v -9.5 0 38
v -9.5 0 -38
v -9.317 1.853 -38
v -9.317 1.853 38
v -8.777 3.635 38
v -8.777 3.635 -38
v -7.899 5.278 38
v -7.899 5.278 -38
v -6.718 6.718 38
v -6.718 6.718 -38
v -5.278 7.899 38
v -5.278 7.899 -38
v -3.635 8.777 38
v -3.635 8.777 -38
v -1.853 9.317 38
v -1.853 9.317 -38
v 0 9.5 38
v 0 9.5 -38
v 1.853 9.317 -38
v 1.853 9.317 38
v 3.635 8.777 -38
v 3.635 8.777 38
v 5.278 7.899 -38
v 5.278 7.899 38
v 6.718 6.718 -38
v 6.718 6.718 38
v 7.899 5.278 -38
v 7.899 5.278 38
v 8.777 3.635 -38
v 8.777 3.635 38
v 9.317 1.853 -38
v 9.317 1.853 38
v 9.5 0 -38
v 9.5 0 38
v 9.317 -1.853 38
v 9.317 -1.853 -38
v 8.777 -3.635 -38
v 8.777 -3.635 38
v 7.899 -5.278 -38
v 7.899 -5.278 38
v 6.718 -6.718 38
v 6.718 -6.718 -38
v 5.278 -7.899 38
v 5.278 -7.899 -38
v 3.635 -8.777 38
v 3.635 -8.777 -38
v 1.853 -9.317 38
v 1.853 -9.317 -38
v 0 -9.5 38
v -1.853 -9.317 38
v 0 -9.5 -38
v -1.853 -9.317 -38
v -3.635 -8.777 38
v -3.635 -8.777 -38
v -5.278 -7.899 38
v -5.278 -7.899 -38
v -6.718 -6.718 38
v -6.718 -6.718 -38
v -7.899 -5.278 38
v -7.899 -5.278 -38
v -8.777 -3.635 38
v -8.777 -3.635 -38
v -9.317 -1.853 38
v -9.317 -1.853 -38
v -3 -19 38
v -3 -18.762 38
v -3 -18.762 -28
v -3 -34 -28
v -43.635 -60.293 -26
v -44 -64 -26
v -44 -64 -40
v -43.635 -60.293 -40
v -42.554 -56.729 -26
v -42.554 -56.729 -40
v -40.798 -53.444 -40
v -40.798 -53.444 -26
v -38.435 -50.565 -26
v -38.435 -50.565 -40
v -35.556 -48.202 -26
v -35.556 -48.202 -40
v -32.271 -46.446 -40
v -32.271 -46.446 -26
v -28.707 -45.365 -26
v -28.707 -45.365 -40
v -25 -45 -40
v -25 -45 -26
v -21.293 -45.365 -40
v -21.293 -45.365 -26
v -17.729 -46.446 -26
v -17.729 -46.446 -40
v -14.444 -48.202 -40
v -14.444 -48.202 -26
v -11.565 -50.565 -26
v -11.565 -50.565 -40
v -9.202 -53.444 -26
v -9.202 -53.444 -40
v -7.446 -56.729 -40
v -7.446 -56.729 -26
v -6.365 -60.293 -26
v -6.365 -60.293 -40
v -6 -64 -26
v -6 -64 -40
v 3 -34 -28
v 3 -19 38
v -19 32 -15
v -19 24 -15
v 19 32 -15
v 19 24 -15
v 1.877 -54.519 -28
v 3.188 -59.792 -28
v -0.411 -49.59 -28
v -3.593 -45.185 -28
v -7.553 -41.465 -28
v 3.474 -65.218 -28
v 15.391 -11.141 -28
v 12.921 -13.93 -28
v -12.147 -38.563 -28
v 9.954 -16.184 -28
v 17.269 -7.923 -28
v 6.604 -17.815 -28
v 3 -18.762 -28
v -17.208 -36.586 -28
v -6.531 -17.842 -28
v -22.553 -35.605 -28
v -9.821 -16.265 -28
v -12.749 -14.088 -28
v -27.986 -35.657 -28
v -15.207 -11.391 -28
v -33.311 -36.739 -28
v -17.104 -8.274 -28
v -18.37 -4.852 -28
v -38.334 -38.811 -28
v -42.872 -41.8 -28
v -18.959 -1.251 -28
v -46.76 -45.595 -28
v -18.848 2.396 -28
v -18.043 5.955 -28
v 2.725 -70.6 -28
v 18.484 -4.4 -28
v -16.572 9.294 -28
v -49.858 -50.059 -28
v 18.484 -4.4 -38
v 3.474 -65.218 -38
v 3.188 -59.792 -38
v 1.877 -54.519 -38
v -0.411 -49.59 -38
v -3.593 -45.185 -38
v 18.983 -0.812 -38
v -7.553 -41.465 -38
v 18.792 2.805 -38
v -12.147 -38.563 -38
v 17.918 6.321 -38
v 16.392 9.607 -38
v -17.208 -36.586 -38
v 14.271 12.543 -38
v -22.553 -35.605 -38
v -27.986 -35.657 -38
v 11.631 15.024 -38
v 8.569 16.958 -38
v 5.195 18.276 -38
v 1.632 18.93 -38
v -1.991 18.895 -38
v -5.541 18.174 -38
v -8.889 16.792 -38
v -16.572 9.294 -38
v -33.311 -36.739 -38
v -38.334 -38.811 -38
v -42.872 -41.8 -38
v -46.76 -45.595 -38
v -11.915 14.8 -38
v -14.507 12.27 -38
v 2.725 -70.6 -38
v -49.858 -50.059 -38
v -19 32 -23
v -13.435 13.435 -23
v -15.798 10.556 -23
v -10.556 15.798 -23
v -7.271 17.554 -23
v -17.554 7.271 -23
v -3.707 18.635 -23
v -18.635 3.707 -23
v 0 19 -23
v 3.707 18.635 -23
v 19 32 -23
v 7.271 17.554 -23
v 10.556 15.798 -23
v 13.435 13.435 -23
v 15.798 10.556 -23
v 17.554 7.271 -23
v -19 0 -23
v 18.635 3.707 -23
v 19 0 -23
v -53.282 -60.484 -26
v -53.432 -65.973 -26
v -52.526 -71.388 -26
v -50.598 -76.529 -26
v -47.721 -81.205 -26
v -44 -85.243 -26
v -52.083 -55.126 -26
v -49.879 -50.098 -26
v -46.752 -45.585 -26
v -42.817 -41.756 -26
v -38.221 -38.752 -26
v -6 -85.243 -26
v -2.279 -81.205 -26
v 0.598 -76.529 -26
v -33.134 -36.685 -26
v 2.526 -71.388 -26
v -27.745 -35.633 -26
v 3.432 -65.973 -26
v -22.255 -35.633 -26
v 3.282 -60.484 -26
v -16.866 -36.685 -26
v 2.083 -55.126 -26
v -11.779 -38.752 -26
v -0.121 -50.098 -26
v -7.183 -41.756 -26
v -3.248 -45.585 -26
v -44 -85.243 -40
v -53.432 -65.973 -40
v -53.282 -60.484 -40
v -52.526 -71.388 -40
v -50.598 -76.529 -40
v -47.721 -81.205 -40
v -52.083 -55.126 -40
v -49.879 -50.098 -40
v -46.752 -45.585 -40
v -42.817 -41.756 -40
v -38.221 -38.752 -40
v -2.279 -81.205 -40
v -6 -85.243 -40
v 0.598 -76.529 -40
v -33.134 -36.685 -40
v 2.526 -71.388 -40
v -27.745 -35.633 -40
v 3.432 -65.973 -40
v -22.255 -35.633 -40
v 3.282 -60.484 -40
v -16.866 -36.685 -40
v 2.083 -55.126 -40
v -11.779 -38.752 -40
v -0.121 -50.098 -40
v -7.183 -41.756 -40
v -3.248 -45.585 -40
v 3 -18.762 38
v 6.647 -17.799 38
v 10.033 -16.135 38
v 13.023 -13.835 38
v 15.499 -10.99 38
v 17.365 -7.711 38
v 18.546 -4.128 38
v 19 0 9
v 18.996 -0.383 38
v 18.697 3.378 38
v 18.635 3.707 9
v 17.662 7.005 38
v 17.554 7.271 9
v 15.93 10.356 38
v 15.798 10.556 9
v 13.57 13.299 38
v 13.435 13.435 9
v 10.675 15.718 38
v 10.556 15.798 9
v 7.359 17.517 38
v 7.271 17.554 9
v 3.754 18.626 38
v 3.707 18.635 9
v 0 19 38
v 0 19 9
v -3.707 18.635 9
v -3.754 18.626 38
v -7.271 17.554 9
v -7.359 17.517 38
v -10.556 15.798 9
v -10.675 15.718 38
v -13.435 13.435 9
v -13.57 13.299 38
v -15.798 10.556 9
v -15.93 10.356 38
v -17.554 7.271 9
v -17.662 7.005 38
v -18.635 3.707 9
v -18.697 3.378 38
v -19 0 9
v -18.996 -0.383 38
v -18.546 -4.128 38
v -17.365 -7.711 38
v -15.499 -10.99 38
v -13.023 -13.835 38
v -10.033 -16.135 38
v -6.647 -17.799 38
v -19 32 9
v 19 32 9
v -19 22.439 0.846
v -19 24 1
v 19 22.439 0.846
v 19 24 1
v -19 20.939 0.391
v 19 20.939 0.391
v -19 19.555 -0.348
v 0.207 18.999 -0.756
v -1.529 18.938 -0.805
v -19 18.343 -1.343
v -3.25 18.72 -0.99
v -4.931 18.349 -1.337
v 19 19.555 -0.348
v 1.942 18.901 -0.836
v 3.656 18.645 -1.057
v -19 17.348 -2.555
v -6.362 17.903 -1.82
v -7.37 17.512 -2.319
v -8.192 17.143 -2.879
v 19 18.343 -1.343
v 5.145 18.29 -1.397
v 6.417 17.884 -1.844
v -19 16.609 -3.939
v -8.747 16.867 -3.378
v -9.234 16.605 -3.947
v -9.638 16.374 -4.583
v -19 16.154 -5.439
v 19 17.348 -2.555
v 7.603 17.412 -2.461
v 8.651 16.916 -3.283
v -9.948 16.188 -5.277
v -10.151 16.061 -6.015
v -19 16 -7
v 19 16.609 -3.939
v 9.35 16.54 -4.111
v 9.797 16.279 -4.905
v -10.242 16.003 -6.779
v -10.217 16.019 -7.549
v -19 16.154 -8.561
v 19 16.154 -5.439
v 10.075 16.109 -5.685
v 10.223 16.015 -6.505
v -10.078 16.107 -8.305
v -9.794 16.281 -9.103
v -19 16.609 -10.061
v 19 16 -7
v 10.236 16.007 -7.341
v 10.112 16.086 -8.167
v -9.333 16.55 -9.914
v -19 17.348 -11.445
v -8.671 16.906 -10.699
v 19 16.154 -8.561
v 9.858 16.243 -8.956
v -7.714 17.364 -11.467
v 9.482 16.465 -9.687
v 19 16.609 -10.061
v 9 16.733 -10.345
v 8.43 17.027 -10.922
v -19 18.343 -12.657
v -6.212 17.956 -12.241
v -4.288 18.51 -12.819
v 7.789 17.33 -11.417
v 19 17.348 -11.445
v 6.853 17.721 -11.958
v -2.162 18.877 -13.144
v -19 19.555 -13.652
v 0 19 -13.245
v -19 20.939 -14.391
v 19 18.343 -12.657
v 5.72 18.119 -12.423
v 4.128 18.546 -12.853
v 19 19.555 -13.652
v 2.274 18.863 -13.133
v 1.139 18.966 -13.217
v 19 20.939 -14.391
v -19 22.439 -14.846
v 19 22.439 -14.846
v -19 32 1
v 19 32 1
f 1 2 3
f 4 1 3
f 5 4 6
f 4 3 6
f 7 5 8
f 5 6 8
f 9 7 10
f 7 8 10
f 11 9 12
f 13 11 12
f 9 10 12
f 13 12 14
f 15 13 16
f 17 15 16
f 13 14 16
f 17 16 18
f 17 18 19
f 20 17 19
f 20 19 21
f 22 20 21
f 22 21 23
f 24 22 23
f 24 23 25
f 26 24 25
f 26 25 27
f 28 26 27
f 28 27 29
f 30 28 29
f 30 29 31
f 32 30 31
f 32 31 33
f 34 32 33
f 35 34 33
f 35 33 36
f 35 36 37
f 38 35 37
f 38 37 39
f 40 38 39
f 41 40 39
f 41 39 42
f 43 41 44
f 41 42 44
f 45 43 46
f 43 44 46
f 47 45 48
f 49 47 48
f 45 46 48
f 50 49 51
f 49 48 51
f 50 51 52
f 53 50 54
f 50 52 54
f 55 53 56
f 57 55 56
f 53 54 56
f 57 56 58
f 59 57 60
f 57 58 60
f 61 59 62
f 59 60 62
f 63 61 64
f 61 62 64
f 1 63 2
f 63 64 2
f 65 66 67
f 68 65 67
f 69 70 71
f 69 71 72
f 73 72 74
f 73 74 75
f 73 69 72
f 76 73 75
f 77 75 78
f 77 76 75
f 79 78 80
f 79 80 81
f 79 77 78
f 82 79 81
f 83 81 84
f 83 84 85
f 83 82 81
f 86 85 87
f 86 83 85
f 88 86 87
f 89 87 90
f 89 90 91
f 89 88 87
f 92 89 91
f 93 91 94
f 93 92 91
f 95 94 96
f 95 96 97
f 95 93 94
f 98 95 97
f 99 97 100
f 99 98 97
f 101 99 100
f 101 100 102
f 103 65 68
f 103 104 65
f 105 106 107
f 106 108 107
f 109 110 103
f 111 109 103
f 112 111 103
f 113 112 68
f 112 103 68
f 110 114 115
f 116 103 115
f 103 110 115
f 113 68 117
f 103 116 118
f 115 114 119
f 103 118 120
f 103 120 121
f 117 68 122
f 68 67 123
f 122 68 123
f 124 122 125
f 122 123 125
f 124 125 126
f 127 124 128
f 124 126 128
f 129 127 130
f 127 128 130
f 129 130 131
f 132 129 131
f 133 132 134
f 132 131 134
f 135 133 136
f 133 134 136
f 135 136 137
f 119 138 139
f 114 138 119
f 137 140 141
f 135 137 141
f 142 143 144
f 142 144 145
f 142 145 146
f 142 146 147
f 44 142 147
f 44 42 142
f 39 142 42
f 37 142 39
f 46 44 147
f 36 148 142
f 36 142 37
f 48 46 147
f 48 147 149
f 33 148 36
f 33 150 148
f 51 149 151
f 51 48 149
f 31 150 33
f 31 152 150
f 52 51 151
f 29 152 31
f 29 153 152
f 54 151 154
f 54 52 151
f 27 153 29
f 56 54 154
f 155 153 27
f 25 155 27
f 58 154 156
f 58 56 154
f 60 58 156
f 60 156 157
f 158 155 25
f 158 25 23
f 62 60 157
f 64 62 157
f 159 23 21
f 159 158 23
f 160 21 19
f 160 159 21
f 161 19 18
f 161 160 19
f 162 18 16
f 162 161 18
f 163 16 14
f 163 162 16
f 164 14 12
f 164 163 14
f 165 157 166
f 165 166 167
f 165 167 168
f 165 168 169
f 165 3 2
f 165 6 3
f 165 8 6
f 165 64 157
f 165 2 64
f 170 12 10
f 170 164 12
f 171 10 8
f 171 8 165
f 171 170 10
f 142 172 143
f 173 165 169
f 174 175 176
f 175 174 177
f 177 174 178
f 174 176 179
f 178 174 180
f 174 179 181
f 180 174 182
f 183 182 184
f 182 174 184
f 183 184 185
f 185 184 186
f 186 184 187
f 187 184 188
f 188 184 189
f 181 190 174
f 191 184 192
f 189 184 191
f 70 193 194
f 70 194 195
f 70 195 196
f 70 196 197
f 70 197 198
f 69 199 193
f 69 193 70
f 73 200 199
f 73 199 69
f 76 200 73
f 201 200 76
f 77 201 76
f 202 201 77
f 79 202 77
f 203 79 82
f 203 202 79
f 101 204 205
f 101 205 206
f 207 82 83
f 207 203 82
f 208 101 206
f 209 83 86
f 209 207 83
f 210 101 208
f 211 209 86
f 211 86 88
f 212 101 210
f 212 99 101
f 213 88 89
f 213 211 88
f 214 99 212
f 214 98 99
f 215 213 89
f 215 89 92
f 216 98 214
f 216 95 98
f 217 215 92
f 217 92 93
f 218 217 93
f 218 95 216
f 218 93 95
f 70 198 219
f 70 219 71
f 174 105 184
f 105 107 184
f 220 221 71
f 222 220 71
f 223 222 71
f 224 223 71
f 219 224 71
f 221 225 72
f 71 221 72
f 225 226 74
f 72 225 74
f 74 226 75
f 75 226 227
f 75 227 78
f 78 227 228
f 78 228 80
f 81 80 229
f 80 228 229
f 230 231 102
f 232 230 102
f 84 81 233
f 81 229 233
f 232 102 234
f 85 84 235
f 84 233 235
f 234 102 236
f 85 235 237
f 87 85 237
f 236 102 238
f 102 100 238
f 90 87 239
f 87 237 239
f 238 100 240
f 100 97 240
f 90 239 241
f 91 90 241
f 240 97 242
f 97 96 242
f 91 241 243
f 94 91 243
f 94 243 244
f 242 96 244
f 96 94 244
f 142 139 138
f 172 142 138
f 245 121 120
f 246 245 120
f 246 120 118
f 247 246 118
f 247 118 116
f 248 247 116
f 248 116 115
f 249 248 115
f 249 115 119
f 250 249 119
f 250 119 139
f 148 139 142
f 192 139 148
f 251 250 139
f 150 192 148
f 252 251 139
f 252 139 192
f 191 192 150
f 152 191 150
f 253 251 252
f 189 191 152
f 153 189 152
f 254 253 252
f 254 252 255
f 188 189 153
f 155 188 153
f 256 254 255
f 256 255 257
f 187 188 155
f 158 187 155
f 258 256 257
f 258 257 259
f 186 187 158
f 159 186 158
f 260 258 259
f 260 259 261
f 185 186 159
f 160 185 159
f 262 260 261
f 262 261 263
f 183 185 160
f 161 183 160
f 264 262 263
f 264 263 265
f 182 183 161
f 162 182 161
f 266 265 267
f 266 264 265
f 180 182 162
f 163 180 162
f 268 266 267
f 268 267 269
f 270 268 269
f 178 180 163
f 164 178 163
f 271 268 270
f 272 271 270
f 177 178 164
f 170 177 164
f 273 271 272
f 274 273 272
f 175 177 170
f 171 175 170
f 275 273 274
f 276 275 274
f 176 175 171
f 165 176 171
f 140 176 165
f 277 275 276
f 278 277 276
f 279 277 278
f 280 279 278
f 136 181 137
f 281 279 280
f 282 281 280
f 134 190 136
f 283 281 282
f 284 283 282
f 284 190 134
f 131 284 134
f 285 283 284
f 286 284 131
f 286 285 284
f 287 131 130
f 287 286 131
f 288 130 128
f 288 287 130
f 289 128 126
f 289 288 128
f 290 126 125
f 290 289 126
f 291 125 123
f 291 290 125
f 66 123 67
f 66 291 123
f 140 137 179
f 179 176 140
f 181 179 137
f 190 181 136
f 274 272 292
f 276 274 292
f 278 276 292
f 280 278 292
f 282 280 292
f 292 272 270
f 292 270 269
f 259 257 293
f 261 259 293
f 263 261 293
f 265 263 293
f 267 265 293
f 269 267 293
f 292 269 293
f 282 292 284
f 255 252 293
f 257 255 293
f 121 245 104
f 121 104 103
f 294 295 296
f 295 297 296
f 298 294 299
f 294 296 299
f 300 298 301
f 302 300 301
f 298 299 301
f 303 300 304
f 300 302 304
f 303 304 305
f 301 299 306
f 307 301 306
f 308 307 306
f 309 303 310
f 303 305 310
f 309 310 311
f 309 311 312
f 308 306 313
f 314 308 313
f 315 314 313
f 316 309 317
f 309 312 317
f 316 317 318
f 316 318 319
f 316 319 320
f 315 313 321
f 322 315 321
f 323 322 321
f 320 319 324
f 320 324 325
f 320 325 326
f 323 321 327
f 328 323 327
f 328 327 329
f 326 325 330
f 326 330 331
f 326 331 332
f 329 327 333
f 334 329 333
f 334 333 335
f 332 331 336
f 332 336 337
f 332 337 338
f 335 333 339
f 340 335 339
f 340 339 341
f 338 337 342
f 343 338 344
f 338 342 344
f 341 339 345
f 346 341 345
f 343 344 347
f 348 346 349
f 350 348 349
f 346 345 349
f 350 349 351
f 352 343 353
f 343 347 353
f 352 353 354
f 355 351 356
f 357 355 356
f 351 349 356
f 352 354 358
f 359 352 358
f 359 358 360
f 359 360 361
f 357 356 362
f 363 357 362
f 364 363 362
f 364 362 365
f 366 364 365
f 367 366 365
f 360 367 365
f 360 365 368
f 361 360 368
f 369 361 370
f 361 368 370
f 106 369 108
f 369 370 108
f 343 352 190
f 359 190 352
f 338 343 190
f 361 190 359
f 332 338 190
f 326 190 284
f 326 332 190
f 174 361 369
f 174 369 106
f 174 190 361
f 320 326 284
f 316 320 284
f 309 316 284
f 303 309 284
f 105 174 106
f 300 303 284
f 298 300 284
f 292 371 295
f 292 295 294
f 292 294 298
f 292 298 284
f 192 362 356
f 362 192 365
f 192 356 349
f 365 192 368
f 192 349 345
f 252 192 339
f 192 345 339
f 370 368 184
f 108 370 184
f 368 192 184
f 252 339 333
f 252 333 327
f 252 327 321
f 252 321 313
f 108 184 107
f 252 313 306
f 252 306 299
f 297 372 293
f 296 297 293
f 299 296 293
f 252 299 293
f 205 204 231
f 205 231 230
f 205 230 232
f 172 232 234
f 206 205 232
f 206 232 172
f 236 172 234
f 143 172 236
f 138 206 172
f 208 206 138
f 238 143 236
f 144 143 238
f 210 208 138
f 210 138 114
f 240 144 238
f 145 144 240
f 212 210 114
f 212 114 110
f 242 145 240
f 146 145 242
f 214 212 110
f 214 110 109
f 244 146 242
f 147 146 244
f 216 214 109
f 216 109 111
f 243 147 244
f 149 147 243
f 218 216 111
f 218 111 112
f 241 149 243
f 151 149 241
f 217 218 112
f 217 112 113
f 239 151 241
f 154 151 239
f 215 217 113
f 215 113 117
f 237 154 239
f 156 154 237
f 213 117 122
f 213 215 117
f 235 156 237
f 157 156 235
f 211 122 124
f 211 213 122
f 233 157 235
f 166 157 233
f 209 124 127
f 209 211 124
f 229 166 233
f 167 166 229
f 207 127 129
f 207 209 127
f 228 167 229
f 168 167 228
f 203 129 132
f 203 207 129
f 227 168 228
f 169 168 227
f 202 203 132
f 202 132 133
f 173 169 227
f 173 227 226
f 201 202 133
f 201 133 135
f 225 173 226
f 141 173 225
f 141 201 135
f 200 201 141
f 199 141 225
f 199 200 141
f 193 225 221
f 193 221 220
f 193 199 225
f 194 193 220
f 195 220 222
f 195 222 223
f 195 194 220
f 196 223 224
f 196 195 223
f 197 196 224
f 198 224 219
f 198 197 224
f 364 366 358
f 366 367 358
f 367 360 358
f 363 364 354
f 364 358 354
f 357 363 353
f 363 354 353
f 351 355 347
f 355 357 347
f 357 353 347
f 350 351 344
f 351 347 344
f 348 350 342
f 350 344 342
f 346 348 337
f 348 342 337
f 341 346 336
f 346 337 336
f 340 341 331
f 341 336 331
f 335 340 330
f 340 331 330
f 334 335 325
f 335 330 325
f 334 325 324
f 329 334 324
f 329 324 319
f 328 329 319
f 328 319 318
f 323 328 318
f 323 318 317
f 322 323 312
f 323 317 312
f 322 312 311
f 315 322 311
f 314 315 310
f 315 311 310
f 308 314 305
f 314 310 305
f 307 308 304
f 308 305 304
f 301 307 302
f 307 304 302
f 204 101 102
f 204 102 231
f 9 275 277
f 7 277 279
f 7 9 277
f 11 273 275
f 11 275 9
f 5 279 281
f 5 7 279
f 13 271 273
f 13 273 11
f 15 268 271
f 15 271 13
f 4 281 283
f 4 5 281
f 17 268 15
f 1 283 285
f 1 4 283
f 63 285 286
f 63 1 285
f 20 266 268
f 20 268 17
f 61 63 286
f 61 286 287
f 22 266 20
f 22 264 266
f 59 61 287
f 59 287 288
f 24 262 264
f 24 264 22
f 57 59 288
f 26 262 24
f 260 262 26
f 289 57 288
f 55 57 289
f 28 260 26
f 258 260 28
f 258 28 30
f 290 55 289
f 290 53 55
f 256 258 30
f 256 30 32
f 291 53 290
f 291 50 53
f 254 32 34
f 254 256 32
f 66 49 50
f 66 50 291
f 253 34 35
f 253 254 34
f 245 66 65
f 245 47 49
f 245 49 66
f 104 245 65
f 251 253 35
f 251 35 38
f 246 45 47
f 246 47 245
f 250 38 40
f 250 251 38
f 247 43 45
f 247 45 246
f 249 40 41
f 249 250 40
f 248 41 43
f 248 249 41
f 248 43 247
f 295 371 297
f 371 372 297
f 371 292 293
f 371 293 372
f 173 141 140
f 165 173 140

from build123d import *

# Parameters (mm, degrees)
SKETCH1_R                = 19
BOSS_EXTRUDE1_DEPTH      = 38
BOSS_EXTRUDE2_DEPTH      = 2
BOSS_EXTRUDE2_DEPTH_BACK = 12
BOSS_EXTRUDE3_START      = -10
BOSS_EXTRUDE3_DEPTH      = 10
BOSS_EXTRUDE4_DEPTH      = 19
HOLE1_D                  = 16
HOLE1_DEPTH              = 100
HOLE2_D                  = 19
HOLE2_DEPTH              = 100
BOSS_EXTRUDE5_DEPTH      = 3


with BuildPart() as part:
    # Sketch1 → Boss-Extrude1 (new, symmetric)
    with BuildSketch(Plane.XY):
        Circle(SKETCH1_R)
    extrude(amount=BOSS_EXTRUDE1_DEPTH, both=True)



with BuildPart() as body_2:
    # Sketch2 → Boss-Extrude2 (new, two sides: drawn at the far end of the back side and taken through both)
    with BuildSketch(Plane(origin=(0, 0, -38), x_dir=(-1, 0, 0), z_dir=(0, 0, -1)).offset(-BOSS_EXTRUDE2_DEPTH_BACK)):
        with BuildLine():
            Line((6, -64), (6, -85.242645786))
            ThreePointArc((6, -85.242645786), (25, -35.5), (44, -85.242645786))
            Line((44, -85.242645786), (44, -64))
            ThreePointArc((44, -64), (25, -45), (6, -64))
        make_face()
    extrude(amount=BOSS_EXTRUDE2_DEPTH + BOSS_EXTRUDE2_DEPTH_BACK)


with BuildPart() as part_1:
    add(part.part)

    add(body_2.part)  # Boss-Extrude3 merges body 2
    # Sketch3 → Boss-Extrude3 (add)
    with BuildSketch(Plane(origin=(0, 0, -38), x_dir=(-1, 0, 0), z_dir=(0, 0, -1)).offset(BOSS_EXTRUDE3_START)):
        with BuildLine():
            Line((-18.483548174, -4.399823506), (-2.725322262, -70.599735258))
            ThreePointArc((-2.725322262, -70.599735258), (14.630259976, -37.45346554), (49.857815378, -50.059447118))
            Line((49.857815378, -50.059447118), (16.571876918, 9.293701921))
            ThreePointArc((16.571876918, 9.293701921), (6.913160016, -17.69768964), (-18.483548174, -4.399823506))
        make_face()
    extrude(amount=BOSS_EXTRUDE3_DEPTH)

    # Sketch4 → Boss-Extrude4 (add, symmetric)
    with BuildSketch(Plane(origin=(0, 0, 0), x_dir=(0, 0, -1), z_dir=(1, 0, 0))):
        with BuildLine():
            Line((-9, 0), (-9, 32))
            Line((-9, 32), (-1, 32))
            Line((-1, 32), (-1, 24))
            ThreePointArc((-1, 24), (7, 16), (15, 24))
            Line((15, 24), (15, 32))
            Line((15, 32), (23, 32))
            Line((23, 32), (23, 0))
            Line((23, 0), (-9, 0))
        make_face()
    extrude(amount=BOSS_EXTRUDE4_DEPTH, both=True)

    # Hole1
    with Locations(Plane(origin=(19, 0, 0), x_dir=(0, 0, -1), z_dir=(1, 0, 0))):
        with Locations((7, 24)):
            Hole(HOLE1_D / 2, depth=HOLE1_DEPTH)

    # Hole2
    with Locations(Plane.XY.offset(38)):
        with Locations((0, 0)):
            Hole(HOLE2_D / 2, depth=HOLE2_DEPTH)

    # Sketch10 → Boss-Extrude5 (add, symmetric)
    with BuildSketch(Plane(origin=(0, 0, 0), x_dir=(0, 0, -1), z_dir=(1, 0, 0))):
        Polygon((-38, -19), (28, -34), (30, -34), (30, -17), (-38, -17), align=None)
    extrude(amount=BOSS_EXTRUDE5_DEPTH, both=True)


solid = part_1.part
